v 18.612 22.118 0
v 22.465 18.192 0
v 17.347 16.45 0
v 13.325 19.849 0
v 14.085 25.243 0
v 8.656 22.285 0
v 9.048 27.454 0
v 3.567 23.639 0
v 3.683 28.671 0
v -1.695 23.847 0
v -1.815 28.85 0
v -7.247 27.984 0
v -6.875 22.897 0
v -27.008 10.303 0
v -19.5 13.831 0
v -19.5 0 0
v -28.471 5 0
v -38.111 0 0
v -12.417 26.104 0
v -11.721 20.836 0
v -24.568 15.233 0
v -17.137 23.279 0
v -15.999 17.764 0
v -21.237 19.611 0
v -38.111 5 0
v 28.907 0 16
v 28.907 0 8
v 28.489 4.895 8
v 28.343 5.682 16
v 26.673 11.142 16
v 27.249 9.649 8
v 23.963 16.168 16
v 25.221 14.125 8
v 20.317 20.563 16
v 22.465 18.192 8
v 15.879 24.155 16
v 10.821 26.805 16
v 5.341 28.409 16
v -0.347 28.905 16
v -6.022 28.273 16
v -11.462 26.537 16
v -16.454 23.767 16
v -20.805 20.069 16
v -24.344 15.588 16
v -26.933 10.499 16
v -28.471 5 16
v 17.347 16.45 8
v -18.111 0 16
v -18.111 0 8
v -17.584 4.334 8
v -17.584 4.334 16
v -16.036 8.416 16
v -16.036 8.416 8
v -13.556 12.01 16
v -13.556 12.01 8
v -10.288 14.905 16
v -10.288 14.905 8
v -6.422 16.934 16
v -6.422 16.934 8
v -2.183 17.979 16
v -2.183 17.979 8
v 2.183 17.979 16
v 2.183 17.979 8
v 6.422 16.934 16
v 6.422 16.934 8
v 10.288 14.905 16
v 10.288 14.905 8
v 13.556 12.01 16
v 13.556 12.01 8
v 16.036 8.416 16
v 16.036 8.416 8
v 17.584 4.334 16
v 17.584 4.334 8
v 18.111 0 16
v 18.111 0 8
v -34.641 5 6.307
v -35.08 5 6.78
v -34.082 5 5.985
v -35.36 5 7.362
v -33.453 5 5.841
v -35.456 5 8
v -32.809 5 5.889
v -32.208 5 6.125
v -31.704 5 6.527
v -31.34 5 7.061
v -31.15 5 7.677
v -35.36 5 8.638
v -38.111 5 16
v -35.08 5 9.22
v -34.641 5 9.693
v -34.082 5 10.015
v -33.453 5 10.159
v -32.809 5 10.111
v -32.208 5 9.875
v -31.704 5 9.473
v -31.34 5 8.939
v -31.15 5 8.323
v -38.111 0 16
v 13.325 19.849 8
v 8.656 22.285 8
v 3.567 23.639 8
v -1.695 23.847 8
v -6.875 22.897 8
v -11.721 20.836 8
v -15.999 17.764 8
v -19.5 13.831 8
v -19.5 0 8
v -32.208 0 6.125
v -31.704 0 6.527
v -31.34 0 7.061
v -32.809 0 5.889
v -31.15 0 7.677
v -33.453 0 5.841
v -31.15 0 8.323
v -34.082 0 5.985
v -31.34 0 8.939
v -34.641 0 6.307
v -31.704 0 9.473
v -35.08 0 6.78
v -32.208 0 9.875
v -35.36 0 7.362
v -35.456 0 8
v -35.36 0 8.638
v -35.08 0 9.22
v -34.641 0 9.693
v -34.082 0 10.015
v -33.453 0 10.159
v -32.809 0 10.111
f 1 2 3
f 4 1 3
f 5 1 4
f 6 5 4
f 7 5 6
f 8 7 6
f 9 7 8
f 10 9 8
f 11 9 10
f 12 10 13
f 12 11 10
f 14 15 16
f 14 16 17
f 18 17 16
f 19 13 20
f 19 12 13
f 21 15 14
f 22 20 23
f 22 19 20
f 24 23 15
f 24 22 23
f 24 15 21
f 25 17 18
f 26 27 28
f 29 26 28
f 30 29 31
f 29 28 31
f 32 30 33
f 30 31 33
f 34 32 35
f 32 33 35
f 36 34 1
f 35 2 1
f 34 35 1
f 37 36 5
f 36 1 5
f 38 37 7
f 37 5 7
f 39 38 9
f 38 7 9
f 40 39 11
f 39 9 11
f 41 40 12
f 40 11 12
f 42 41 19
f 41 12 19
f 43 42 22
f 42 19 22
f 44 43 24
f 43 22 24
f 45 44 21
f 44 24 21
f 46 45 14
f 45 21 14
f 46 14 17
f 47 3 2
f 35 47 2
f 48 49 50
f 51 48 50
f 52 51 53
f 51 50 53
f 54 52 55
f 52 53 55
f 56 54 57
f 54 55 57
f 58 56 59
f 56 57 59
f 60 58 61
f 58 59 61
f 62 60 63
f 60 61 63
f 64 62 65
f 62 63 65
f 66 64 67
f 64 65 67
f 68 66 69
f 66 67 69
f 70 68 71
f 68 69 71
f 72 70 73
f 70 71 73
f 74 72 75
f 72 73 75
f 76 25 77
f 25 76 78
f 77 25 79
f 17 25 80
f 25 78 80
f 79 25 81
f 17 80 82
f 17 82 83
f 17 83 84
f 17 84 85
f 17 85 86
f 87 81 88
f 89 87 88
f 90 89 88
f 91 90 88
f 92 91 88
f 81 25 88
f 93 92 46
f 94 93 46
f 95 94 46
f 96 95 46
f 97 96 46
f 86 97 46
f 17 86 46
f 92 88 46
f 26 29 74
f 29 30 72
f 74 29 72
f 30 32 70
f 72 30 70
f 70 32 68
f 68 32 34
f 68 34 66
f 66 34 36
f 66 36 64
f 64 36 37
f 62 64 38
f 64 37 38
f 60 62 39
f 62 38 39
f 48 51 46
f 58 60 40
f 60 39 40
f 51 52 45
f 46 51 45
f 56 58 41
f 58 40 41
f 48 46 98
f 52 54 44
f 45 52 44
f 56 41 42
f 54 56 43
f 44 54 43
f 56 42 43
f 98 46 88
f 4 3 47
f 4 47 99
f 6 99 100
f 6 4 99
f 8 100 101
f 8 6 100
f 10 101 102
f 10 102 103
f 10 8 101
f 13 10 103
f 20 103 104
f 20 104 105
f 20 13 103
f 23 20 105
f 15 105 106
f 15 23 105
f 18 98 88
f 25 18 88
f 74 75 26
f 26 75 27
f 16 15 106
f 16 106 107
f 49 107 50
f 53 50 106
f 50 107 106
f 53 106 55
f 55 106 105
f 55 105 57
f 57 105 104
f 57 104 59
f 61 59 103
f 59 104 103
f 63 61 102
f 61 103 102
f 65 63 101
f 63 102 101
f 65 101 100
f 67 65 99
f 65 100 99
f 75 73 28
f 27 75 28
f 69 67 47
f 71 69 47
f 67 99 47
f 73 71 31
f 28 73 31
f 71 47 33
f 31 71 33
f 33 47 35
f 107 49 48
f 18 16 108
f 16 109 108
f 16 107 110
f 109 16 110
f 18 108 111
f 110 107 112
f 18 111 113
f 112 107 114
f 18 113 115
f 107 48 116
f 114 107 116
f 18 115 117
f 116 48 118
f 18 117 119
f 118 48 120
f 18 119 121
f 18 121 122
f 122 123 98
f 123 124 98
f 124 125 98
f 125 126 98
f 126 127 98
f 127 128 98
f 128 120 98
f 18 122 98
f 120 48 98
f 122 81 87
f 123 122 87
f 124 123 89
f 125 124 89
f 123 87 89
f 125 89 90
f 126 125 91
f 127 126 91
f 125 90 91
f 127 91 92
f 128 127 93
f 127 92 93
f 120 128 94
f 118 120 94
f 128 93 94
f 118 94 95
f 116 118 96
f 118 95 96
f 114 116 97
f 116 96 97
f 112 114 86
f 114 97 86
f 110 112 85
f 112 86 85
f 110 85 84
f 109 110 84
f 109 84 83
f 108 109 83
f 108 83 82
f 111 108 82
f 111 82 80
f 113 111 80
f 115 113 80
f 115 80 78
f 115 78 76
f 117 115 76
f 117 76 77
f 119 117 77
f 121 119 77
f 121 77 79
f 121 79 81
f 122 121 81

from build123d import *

# Parameters (mm, degrees)
BOSS_EXTRUDE1_DEPTH = 8
BOSS_EXTRUDE2_DEPTH = 8
BOSS_EXTRUDE3_DEPTH = 16
SKETCH4_R           = 2.165
CUT_EXTRUDE1_DEPTH  = 48.748826419
CUT_EXTRUDE2_DEPTH  = 8


with BuildPart() as part:
    # Sketch1 → Boss-Extrude1 (new body)
    with BuildSketch(Plane.XY):
        with BuildLine():
            Line((-19.5, 13.830605225), (-19.5, 0))
            Line((-19.5, 0), (-28.9068116, 0))
            ThreePointArc((-28.9068116, 0), (0, 28.9068116), (28.9068116, 0))
            Line((28.9068116, 0), (23.9068116, 0))
            ThreePointArc((23.9068116, 0), (7.257851427, 22.778481809), (-19.5, 13.830605225))
        make_face()
    extrude(amount=BOSS_EXTRUDE1_DEPTH)

    # Sketch2 → Boss-Extrude2 (add)
    with BuildSketch(Plane.XY.offset(8)):
        with BuildLine():
            Line((-28.9068116, 0), (-18.11056, 0))
            ThreePointArc((-18.11056, 0), (0, 18.11056), (18.11056, 0))
            Line((18.11056, 0), (28.9068116, 0))
            ThreePointArc((28.9068116, 0), (0, 28.9068116), (-28.9068116, 0))
        make_face()
    extrude(amount=BOSS_EXTRUDE2_DEPTH)

    # Sketch3 → Boss-Extrude3 (add, through all)
    with BuildSketch(Plane.XY.offset(16)):
        with BuildLine():
            Line((-28.9068116, 0), (-38.11056, 0))
            Line((-38.11056, 0), (-38.11056, 5))
            Line((-38.11056, 5), (-28.471103893, 5))
            ThreePointArc((-28.471103893, 5), (-28.797678666, 2.509474109), (-28.9068116, 0))
        make_face()
    extrude(amount=-BOSS_EXTRUDE3_DEPTH)

    # Sketch4 → Cut-Extrude1 (cut, through all)
    with BuildSketch(Plane(origin=(0, 5, 0), x_dir=(1, 0, 0), z_dir=(0, 1, 0))):
        with Locations(Location((-33.290831946, -8, 0), (0, 0, 180))):
            Circle(SKETCH4_R)
    extrude(amount=-CUT_EXTRUDE1_DEPTH, mode=Mode.SUBTRACT)

    # Sketch5 → Cut-Extrude2 (cut)
    with BuildSketch(Plane(origin=(0, 0, 0), x_dir=(-1, 0, 0), z_dir=(0, 0, -1))):
        Polygon((0, 0), (-17.347099568, 16.450342776), (-43.024104882, 25.187540913), (-58.13318285, -8.31229871), align=None)
    extrude(amount=-CUT_EXTRUDE2_DEPTH, mode=Mode.SUBTRACT)


solid = part.part
